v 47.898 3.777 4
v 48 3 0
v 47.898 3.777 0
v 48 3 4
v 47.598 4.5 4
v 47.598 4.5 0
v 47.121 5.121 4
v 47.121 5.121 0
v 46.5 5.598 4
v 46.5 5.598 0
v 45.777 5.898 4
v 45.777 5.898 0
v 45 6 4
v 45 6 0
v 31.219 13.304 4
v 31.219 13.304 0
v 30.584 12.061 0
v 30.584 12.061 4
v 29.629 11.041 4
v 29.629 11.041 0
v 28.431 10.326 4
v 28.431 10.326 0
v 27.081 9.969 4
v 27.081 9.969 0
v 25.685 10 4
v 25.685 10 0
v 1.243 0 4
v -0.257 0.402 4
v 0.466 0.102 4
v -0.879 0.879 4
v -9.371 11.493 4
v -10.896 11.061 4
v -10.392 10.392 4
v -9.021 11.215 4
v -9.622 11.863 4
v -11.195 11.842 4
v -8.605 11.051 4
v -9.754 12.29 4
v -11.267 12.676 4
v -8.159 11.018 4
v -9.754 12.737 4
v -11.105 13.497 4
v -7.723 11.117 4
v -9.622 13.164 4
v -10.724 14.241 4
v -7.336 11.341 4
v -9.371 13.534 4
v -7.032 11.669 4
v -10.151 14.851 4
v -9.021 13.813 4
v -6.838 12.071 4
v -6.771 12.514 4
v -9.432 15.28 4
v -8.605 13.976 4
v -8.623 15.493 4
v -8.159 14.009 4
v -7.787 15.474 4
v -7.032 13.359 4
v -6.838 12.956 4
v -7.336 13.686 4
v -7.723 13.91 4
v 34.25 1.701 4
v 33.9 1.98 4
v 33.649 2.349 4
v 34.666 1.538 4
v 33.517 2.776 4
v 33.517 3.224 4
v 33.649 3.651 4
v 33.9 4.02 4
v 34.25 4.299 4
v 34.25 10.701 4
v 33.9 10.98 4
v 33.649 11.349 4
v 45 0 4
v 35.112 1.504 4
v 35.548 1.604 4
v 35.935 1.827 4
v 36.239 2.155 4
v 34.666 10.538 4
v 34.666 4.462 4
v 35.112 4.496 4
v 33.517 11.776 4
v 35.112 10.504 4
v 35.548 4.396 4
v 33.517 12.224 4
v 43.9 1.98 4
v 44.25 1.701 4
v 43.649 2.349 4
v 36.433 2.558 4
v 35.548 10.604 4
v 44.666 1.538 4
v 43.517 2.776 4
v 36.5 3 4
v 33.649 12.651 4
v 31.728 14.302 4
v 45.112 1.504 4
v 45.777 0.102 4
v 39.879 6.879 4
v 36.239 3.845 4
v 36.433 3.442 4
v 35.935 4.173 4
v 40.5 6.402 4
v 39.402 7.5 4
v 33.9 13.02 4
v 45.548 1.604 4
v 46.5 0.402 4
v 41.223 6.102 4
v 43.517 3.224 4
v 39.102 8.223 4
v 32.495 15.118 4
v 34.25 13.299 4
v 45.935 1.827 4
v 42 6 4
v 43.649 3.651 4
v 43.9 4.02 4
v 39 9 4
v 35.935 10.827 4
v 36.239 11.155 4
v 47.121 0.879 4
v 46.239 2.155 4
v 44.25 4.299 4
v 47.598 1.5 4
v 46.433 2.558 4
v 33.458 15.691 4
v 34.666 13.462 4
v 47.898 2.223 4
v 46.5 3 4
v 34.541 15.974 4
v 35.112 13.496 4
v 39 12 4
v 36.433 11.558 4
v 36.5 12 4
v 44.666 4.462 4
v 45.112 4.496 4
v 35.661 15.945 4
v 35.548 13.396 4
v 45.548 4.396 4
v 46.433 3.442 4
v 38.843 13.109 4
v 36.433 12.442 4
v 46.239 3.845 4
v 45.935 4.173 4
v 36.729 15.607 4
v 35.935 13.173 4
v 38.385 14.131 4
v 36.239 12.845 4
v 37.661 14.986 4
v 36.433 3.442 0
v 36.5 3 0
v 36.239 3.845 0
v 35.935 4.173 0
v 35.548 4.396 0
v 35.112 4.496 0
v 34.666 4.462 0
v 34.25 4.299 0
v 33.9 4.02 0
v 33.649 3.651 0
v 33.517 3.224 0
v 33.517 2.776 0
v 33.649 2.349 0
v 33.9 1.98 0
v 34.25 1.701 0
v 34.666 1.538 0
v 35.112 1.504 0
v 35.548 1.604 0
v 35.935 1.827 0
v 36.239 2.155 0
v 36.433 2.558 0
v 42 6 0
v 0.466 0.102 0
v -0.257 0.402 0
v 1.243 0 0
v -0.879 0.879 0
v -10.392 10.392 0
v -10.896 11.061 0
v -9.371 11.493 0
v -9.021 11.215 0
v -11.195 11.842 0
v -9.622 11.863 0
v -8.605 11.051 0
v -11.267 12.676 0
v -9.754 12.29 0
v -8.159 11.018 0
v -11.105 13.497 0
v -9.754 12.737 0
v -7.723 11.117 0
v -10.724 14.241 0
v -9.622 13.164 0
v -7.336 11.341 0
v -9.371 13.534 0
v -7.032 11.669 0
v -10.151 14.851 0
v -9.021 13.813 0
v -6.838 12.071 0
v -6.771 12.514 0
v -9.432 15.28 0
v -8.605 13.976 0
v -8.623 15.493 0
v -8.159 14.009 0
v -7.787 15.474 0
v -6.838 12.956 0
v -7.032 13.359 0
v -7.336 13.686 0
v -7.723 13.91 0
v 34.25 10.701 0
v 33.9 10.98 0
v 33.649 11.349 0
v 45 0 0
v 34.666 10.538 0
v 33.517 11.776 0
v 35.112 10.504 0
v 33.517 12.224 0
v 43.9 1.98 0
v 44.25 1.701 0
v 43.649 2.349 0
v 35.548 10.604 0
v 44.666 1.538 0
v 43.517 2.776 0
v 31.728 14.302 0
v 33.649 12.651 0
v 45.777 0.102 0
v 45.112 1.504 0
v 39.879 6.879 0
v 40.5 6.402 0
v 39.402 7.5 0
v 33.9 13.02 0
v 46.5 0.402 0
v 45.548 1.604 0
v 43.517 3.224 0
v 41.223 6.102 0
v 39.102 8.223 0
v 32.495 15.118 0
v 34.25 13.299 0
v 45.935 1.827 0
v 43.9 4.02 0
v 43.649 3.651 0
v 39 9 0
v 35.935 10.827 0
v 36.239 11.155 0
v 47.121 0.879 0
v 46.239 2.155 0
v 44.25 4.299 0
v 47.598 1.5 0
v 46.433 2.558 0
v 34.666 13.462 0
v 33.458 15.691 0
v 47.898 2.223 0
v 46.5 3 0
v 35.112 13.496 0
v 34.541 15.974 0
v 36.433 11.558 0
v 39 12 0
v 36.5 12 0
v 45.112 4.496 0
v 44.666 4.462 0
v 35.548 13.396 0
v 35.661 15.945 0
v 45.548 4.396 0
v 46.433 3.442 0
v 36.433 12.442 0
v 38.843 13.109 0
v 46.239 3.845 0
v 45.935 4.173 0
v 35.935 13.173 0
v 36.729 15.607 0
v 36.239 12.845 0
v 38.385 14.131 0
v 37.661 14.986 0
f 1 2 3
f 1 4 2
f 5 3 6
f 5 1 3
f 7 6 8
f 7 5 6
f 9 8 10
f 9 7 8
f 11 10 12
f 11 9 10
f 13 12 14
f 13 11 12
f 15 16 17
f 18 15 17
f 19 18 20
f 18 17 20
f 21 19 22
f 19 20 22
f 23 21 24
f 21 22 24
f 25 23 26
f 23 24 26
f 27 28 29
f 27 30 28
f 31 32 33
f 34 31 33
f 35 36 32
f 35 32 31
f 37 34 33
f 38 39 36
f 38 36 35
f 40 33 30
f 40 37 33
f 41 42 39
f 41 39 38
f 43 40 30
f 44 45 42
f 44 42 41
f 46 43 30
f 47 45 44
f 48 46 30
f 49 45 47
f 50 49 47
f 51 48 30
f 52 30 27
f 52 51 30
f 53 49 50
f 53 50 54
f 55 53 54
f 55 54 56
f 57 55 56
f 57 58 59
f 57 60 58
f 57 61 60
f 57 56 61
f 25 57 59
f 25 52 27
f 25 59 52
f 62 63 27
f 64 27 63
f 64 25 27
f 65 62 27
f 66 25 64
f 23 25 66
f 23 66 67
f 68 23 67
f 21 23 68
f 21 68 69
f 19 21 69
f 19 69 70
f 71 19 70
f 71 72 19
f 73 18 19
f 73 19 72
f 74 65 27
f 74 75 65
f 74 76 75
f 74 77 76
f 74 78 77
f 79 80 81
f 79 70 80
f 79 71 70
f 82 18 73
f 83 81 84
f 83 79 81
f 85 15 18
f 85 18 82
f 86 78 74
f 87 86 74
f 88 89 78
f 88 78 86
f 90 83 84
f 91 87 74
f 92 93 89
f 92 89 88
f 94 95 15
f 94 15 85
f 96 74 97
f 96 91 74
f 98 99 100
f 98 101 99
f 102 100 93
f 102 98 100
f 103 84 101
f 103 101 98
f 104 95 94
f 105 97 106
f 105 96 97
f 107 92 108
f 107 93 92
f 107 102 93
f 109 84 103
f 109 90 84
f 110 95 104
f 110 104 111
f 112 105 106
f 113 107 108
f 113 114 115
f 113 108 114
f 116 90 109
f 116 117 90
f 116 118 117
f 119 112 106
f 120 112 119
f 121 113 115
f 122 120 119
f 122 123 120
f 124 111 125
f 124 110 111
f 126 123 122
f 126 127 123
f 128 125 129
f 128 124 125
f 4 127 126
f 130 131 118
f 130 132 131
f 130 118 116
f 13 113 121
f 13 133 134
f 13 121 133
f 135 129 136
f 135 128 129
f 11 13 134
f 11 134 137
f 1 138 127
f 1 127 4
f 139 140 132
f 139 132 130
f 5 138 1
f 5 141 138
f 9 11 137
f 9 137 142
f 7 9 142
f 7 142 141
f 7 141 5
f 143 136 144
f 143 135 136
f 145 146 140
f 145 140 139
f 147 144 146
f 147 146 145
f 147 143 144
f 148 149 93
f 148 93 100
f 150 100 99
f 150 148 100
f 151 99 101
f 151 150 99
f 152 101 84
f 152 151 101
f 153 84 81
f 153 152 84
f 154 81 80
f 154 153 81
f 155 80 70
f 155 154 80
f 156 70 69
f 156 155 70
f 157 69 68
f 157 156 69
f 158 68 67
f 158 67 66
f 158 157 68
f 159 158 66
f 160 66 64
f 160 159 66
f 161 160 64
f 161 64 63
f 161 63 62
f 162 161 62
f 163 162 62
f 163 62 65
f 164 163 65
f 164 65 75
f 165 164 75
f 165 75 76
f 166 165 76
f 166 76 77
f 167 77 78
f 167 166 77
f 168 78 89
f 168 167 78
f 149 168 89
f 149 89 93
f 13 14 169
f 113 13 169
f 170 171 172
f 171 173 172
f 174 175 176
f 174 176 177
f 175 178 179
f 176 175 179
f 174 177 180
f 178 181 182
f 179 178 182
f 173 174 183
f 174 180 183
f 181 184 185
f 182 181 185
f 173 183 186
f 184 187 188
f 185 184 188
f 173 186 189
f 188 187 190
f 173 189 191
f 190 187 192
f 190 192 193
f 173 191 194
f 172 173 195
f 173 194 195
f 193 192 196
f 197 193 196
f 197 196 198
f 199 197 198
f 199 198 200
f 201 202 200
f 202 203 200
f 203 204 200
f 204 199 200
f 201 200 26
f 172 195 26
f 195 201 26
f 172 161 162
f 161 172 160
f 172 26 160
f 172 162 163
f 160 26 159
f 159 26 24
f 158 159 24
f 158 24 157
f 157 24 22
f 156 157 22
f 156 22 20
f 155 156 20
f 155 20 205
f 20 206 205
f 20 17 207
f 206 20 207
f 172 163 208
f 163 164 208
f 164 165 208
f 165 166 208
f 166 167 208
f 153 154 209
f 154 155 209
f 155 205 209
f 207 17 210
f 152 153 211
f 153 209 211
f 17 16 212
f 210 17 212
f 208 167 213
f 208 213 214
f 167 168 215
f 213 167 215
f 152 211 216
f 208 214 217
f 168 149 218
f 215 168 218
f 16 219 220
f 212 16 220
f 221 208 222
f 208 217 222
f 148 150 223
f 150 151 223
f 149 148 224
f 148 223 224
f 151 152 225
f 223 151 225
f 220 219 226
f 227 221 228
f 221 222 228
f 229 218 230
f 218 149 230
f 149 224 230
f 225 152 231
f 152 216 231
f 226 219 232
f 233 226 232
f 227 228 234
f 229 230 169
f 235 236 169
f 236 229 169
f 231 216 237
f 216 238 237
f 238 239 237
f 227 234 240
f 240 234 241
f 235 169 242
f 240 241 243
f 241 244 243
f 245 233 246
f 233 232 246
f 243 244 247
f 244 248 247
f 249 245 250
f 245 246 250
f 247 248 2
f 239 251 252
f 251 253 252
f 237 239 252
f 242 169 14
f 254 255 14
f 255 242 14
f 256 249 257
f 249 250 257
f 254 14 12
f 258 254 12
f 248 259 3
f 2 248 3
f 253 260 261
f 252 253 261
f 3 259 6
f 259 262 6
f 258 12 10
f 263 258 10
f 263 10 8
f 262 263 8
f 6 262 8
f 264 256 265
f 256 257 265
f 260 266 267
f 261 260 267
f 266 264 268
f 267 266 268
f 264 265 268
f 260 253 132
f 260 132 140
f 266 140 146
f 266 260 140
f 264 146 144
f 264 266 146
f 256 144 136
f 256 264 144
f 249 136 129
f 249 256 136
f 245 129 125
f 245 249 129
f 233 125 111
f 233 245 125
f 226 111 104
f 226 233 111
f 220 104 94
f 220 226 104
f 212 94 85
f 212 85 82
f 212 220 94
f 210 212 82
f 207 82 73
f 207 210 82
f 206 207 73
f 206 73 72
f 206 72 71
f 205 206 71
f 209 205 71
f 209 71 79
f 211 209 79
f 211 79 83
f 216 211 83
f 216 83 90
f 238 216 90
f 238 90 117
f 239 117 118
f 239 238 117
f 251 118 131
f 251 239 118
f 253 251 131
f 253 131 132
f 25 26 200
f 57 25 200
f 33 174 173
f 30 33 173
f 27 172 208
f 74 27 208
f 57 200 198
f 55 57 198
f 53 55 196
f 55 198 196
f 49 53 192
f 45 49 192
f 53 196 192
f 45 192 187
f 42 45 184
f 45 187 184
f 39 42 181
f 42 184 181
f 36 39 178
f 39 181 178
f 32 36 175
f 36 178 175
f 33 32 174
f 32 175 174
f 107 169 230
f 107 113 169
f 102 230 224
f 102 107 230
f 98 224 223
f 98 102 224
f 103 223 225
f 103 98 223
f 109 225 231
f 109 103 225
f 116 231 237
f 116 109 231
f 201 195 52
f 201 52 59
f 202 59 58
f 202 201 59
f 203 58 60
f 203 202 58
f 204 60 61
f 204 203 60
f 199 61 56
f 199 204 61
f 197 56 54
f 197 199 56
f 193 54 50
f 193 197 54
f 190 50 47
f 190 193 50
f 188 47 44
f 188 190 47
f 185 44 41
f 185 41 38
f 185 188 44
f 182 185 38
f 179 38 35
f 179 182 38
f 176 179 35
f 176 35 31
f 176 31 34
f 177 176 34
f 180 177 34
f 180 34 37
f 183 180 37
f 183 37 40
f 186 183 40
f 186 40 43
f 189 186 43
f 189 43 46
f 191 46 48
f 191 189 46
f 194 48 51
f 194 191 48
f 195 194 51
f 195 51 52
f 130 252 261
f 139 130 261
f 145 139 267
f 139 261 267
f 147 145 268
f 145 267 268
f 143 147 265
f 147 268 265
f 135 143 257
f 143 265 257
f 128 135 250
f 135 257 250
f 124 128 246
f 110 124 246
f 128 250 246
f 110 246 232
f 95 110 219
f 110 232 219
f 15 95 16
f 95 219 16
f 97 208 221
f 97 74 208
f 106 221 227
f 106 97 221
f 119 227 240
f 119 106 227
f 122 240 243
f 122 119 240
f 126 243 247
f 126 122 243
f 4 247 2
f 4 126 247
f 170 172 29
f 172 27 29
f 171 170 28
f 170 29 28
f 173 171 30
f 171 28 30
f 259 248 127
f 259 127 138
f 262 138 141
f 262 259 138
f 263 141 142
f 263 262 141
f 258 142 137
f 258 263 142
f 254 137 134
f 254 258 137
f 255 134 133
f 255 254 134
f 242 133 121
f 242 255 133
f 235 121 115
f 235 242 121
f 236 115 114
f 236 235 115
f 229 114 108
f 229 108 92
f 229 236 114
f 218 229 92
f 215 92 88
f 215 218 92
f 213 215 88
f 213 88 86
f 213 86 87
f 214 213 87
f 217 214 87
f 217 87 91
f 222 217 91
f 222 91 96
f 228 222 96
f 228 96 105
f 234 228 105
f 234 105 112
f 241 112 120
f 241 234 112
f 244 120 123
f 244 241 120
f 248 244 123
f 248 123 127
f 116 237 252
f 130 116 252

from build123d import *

# Parameters (mm, degrees)
SKETCH1_R           = 1.5
BOSS_EXTRUDE1_DEPTH = 4
FILLET1_R           = 3


with BuildPart() as part:
    # Sketch1 → Boss-Extrude1 (new body)
    with BuildSketch(Plane.XY):
        with BuildLine():
            Line((0, 0), (48, 0))
            Line((48, 0), (48, 6))
            Line((48, 6), (39, 6))
            Line((39, 6), (39, 12))
            ThreePointArc((39, 12), (35.661193516, 15.944974415), (31.218588433, 13.304195753))
            ThreePointArc((31.218588433, 13.304195753), (29.055123964, 10.641481887), (25.684793917, 10))
            Line((25.684793917, 10), (-7.786766468, 15.474289455))
            ThreePointArc((-7.786766468, 15.474289455), (-10.94056647, 13.882322422), (-10.392304845, 10.392304845))
            Line((-10.392304845, 10.392304845), (0, 0))
        make_face()
        with Locations((35, 12)):
            Circle(SKETCH1_R, mode=Mode.SUBTRACT)
        with Locations((-8.270984502, 12.513625189)):
            Circle(SKETCH1_R, mode=Mode.SUBTRACT)
        with Locations((35, 3)):
            Circle(SKETCH1_R, mode=Mode.SUBTRACT)
        with Locations((45, 3)):
            Circle(SKETCH1_R, mode=Mode.SUBTRACT)
    extrude(amount=BOSS_EXTRUDE1_DEPTH)

    # Fillet1
    fillet1_edges = [part.edges().sort_by_distance(p)[0] for p in [
        (48, 0, 2),
        (48, 6, 2),
        (39, 6, 2),
        (0, 0, 2),
    ]]
    fillet(fillet1_edges, radius=FILLET1_R - 0.0001)  # a hair under: the kernel refuses the full size


solid = part.part
